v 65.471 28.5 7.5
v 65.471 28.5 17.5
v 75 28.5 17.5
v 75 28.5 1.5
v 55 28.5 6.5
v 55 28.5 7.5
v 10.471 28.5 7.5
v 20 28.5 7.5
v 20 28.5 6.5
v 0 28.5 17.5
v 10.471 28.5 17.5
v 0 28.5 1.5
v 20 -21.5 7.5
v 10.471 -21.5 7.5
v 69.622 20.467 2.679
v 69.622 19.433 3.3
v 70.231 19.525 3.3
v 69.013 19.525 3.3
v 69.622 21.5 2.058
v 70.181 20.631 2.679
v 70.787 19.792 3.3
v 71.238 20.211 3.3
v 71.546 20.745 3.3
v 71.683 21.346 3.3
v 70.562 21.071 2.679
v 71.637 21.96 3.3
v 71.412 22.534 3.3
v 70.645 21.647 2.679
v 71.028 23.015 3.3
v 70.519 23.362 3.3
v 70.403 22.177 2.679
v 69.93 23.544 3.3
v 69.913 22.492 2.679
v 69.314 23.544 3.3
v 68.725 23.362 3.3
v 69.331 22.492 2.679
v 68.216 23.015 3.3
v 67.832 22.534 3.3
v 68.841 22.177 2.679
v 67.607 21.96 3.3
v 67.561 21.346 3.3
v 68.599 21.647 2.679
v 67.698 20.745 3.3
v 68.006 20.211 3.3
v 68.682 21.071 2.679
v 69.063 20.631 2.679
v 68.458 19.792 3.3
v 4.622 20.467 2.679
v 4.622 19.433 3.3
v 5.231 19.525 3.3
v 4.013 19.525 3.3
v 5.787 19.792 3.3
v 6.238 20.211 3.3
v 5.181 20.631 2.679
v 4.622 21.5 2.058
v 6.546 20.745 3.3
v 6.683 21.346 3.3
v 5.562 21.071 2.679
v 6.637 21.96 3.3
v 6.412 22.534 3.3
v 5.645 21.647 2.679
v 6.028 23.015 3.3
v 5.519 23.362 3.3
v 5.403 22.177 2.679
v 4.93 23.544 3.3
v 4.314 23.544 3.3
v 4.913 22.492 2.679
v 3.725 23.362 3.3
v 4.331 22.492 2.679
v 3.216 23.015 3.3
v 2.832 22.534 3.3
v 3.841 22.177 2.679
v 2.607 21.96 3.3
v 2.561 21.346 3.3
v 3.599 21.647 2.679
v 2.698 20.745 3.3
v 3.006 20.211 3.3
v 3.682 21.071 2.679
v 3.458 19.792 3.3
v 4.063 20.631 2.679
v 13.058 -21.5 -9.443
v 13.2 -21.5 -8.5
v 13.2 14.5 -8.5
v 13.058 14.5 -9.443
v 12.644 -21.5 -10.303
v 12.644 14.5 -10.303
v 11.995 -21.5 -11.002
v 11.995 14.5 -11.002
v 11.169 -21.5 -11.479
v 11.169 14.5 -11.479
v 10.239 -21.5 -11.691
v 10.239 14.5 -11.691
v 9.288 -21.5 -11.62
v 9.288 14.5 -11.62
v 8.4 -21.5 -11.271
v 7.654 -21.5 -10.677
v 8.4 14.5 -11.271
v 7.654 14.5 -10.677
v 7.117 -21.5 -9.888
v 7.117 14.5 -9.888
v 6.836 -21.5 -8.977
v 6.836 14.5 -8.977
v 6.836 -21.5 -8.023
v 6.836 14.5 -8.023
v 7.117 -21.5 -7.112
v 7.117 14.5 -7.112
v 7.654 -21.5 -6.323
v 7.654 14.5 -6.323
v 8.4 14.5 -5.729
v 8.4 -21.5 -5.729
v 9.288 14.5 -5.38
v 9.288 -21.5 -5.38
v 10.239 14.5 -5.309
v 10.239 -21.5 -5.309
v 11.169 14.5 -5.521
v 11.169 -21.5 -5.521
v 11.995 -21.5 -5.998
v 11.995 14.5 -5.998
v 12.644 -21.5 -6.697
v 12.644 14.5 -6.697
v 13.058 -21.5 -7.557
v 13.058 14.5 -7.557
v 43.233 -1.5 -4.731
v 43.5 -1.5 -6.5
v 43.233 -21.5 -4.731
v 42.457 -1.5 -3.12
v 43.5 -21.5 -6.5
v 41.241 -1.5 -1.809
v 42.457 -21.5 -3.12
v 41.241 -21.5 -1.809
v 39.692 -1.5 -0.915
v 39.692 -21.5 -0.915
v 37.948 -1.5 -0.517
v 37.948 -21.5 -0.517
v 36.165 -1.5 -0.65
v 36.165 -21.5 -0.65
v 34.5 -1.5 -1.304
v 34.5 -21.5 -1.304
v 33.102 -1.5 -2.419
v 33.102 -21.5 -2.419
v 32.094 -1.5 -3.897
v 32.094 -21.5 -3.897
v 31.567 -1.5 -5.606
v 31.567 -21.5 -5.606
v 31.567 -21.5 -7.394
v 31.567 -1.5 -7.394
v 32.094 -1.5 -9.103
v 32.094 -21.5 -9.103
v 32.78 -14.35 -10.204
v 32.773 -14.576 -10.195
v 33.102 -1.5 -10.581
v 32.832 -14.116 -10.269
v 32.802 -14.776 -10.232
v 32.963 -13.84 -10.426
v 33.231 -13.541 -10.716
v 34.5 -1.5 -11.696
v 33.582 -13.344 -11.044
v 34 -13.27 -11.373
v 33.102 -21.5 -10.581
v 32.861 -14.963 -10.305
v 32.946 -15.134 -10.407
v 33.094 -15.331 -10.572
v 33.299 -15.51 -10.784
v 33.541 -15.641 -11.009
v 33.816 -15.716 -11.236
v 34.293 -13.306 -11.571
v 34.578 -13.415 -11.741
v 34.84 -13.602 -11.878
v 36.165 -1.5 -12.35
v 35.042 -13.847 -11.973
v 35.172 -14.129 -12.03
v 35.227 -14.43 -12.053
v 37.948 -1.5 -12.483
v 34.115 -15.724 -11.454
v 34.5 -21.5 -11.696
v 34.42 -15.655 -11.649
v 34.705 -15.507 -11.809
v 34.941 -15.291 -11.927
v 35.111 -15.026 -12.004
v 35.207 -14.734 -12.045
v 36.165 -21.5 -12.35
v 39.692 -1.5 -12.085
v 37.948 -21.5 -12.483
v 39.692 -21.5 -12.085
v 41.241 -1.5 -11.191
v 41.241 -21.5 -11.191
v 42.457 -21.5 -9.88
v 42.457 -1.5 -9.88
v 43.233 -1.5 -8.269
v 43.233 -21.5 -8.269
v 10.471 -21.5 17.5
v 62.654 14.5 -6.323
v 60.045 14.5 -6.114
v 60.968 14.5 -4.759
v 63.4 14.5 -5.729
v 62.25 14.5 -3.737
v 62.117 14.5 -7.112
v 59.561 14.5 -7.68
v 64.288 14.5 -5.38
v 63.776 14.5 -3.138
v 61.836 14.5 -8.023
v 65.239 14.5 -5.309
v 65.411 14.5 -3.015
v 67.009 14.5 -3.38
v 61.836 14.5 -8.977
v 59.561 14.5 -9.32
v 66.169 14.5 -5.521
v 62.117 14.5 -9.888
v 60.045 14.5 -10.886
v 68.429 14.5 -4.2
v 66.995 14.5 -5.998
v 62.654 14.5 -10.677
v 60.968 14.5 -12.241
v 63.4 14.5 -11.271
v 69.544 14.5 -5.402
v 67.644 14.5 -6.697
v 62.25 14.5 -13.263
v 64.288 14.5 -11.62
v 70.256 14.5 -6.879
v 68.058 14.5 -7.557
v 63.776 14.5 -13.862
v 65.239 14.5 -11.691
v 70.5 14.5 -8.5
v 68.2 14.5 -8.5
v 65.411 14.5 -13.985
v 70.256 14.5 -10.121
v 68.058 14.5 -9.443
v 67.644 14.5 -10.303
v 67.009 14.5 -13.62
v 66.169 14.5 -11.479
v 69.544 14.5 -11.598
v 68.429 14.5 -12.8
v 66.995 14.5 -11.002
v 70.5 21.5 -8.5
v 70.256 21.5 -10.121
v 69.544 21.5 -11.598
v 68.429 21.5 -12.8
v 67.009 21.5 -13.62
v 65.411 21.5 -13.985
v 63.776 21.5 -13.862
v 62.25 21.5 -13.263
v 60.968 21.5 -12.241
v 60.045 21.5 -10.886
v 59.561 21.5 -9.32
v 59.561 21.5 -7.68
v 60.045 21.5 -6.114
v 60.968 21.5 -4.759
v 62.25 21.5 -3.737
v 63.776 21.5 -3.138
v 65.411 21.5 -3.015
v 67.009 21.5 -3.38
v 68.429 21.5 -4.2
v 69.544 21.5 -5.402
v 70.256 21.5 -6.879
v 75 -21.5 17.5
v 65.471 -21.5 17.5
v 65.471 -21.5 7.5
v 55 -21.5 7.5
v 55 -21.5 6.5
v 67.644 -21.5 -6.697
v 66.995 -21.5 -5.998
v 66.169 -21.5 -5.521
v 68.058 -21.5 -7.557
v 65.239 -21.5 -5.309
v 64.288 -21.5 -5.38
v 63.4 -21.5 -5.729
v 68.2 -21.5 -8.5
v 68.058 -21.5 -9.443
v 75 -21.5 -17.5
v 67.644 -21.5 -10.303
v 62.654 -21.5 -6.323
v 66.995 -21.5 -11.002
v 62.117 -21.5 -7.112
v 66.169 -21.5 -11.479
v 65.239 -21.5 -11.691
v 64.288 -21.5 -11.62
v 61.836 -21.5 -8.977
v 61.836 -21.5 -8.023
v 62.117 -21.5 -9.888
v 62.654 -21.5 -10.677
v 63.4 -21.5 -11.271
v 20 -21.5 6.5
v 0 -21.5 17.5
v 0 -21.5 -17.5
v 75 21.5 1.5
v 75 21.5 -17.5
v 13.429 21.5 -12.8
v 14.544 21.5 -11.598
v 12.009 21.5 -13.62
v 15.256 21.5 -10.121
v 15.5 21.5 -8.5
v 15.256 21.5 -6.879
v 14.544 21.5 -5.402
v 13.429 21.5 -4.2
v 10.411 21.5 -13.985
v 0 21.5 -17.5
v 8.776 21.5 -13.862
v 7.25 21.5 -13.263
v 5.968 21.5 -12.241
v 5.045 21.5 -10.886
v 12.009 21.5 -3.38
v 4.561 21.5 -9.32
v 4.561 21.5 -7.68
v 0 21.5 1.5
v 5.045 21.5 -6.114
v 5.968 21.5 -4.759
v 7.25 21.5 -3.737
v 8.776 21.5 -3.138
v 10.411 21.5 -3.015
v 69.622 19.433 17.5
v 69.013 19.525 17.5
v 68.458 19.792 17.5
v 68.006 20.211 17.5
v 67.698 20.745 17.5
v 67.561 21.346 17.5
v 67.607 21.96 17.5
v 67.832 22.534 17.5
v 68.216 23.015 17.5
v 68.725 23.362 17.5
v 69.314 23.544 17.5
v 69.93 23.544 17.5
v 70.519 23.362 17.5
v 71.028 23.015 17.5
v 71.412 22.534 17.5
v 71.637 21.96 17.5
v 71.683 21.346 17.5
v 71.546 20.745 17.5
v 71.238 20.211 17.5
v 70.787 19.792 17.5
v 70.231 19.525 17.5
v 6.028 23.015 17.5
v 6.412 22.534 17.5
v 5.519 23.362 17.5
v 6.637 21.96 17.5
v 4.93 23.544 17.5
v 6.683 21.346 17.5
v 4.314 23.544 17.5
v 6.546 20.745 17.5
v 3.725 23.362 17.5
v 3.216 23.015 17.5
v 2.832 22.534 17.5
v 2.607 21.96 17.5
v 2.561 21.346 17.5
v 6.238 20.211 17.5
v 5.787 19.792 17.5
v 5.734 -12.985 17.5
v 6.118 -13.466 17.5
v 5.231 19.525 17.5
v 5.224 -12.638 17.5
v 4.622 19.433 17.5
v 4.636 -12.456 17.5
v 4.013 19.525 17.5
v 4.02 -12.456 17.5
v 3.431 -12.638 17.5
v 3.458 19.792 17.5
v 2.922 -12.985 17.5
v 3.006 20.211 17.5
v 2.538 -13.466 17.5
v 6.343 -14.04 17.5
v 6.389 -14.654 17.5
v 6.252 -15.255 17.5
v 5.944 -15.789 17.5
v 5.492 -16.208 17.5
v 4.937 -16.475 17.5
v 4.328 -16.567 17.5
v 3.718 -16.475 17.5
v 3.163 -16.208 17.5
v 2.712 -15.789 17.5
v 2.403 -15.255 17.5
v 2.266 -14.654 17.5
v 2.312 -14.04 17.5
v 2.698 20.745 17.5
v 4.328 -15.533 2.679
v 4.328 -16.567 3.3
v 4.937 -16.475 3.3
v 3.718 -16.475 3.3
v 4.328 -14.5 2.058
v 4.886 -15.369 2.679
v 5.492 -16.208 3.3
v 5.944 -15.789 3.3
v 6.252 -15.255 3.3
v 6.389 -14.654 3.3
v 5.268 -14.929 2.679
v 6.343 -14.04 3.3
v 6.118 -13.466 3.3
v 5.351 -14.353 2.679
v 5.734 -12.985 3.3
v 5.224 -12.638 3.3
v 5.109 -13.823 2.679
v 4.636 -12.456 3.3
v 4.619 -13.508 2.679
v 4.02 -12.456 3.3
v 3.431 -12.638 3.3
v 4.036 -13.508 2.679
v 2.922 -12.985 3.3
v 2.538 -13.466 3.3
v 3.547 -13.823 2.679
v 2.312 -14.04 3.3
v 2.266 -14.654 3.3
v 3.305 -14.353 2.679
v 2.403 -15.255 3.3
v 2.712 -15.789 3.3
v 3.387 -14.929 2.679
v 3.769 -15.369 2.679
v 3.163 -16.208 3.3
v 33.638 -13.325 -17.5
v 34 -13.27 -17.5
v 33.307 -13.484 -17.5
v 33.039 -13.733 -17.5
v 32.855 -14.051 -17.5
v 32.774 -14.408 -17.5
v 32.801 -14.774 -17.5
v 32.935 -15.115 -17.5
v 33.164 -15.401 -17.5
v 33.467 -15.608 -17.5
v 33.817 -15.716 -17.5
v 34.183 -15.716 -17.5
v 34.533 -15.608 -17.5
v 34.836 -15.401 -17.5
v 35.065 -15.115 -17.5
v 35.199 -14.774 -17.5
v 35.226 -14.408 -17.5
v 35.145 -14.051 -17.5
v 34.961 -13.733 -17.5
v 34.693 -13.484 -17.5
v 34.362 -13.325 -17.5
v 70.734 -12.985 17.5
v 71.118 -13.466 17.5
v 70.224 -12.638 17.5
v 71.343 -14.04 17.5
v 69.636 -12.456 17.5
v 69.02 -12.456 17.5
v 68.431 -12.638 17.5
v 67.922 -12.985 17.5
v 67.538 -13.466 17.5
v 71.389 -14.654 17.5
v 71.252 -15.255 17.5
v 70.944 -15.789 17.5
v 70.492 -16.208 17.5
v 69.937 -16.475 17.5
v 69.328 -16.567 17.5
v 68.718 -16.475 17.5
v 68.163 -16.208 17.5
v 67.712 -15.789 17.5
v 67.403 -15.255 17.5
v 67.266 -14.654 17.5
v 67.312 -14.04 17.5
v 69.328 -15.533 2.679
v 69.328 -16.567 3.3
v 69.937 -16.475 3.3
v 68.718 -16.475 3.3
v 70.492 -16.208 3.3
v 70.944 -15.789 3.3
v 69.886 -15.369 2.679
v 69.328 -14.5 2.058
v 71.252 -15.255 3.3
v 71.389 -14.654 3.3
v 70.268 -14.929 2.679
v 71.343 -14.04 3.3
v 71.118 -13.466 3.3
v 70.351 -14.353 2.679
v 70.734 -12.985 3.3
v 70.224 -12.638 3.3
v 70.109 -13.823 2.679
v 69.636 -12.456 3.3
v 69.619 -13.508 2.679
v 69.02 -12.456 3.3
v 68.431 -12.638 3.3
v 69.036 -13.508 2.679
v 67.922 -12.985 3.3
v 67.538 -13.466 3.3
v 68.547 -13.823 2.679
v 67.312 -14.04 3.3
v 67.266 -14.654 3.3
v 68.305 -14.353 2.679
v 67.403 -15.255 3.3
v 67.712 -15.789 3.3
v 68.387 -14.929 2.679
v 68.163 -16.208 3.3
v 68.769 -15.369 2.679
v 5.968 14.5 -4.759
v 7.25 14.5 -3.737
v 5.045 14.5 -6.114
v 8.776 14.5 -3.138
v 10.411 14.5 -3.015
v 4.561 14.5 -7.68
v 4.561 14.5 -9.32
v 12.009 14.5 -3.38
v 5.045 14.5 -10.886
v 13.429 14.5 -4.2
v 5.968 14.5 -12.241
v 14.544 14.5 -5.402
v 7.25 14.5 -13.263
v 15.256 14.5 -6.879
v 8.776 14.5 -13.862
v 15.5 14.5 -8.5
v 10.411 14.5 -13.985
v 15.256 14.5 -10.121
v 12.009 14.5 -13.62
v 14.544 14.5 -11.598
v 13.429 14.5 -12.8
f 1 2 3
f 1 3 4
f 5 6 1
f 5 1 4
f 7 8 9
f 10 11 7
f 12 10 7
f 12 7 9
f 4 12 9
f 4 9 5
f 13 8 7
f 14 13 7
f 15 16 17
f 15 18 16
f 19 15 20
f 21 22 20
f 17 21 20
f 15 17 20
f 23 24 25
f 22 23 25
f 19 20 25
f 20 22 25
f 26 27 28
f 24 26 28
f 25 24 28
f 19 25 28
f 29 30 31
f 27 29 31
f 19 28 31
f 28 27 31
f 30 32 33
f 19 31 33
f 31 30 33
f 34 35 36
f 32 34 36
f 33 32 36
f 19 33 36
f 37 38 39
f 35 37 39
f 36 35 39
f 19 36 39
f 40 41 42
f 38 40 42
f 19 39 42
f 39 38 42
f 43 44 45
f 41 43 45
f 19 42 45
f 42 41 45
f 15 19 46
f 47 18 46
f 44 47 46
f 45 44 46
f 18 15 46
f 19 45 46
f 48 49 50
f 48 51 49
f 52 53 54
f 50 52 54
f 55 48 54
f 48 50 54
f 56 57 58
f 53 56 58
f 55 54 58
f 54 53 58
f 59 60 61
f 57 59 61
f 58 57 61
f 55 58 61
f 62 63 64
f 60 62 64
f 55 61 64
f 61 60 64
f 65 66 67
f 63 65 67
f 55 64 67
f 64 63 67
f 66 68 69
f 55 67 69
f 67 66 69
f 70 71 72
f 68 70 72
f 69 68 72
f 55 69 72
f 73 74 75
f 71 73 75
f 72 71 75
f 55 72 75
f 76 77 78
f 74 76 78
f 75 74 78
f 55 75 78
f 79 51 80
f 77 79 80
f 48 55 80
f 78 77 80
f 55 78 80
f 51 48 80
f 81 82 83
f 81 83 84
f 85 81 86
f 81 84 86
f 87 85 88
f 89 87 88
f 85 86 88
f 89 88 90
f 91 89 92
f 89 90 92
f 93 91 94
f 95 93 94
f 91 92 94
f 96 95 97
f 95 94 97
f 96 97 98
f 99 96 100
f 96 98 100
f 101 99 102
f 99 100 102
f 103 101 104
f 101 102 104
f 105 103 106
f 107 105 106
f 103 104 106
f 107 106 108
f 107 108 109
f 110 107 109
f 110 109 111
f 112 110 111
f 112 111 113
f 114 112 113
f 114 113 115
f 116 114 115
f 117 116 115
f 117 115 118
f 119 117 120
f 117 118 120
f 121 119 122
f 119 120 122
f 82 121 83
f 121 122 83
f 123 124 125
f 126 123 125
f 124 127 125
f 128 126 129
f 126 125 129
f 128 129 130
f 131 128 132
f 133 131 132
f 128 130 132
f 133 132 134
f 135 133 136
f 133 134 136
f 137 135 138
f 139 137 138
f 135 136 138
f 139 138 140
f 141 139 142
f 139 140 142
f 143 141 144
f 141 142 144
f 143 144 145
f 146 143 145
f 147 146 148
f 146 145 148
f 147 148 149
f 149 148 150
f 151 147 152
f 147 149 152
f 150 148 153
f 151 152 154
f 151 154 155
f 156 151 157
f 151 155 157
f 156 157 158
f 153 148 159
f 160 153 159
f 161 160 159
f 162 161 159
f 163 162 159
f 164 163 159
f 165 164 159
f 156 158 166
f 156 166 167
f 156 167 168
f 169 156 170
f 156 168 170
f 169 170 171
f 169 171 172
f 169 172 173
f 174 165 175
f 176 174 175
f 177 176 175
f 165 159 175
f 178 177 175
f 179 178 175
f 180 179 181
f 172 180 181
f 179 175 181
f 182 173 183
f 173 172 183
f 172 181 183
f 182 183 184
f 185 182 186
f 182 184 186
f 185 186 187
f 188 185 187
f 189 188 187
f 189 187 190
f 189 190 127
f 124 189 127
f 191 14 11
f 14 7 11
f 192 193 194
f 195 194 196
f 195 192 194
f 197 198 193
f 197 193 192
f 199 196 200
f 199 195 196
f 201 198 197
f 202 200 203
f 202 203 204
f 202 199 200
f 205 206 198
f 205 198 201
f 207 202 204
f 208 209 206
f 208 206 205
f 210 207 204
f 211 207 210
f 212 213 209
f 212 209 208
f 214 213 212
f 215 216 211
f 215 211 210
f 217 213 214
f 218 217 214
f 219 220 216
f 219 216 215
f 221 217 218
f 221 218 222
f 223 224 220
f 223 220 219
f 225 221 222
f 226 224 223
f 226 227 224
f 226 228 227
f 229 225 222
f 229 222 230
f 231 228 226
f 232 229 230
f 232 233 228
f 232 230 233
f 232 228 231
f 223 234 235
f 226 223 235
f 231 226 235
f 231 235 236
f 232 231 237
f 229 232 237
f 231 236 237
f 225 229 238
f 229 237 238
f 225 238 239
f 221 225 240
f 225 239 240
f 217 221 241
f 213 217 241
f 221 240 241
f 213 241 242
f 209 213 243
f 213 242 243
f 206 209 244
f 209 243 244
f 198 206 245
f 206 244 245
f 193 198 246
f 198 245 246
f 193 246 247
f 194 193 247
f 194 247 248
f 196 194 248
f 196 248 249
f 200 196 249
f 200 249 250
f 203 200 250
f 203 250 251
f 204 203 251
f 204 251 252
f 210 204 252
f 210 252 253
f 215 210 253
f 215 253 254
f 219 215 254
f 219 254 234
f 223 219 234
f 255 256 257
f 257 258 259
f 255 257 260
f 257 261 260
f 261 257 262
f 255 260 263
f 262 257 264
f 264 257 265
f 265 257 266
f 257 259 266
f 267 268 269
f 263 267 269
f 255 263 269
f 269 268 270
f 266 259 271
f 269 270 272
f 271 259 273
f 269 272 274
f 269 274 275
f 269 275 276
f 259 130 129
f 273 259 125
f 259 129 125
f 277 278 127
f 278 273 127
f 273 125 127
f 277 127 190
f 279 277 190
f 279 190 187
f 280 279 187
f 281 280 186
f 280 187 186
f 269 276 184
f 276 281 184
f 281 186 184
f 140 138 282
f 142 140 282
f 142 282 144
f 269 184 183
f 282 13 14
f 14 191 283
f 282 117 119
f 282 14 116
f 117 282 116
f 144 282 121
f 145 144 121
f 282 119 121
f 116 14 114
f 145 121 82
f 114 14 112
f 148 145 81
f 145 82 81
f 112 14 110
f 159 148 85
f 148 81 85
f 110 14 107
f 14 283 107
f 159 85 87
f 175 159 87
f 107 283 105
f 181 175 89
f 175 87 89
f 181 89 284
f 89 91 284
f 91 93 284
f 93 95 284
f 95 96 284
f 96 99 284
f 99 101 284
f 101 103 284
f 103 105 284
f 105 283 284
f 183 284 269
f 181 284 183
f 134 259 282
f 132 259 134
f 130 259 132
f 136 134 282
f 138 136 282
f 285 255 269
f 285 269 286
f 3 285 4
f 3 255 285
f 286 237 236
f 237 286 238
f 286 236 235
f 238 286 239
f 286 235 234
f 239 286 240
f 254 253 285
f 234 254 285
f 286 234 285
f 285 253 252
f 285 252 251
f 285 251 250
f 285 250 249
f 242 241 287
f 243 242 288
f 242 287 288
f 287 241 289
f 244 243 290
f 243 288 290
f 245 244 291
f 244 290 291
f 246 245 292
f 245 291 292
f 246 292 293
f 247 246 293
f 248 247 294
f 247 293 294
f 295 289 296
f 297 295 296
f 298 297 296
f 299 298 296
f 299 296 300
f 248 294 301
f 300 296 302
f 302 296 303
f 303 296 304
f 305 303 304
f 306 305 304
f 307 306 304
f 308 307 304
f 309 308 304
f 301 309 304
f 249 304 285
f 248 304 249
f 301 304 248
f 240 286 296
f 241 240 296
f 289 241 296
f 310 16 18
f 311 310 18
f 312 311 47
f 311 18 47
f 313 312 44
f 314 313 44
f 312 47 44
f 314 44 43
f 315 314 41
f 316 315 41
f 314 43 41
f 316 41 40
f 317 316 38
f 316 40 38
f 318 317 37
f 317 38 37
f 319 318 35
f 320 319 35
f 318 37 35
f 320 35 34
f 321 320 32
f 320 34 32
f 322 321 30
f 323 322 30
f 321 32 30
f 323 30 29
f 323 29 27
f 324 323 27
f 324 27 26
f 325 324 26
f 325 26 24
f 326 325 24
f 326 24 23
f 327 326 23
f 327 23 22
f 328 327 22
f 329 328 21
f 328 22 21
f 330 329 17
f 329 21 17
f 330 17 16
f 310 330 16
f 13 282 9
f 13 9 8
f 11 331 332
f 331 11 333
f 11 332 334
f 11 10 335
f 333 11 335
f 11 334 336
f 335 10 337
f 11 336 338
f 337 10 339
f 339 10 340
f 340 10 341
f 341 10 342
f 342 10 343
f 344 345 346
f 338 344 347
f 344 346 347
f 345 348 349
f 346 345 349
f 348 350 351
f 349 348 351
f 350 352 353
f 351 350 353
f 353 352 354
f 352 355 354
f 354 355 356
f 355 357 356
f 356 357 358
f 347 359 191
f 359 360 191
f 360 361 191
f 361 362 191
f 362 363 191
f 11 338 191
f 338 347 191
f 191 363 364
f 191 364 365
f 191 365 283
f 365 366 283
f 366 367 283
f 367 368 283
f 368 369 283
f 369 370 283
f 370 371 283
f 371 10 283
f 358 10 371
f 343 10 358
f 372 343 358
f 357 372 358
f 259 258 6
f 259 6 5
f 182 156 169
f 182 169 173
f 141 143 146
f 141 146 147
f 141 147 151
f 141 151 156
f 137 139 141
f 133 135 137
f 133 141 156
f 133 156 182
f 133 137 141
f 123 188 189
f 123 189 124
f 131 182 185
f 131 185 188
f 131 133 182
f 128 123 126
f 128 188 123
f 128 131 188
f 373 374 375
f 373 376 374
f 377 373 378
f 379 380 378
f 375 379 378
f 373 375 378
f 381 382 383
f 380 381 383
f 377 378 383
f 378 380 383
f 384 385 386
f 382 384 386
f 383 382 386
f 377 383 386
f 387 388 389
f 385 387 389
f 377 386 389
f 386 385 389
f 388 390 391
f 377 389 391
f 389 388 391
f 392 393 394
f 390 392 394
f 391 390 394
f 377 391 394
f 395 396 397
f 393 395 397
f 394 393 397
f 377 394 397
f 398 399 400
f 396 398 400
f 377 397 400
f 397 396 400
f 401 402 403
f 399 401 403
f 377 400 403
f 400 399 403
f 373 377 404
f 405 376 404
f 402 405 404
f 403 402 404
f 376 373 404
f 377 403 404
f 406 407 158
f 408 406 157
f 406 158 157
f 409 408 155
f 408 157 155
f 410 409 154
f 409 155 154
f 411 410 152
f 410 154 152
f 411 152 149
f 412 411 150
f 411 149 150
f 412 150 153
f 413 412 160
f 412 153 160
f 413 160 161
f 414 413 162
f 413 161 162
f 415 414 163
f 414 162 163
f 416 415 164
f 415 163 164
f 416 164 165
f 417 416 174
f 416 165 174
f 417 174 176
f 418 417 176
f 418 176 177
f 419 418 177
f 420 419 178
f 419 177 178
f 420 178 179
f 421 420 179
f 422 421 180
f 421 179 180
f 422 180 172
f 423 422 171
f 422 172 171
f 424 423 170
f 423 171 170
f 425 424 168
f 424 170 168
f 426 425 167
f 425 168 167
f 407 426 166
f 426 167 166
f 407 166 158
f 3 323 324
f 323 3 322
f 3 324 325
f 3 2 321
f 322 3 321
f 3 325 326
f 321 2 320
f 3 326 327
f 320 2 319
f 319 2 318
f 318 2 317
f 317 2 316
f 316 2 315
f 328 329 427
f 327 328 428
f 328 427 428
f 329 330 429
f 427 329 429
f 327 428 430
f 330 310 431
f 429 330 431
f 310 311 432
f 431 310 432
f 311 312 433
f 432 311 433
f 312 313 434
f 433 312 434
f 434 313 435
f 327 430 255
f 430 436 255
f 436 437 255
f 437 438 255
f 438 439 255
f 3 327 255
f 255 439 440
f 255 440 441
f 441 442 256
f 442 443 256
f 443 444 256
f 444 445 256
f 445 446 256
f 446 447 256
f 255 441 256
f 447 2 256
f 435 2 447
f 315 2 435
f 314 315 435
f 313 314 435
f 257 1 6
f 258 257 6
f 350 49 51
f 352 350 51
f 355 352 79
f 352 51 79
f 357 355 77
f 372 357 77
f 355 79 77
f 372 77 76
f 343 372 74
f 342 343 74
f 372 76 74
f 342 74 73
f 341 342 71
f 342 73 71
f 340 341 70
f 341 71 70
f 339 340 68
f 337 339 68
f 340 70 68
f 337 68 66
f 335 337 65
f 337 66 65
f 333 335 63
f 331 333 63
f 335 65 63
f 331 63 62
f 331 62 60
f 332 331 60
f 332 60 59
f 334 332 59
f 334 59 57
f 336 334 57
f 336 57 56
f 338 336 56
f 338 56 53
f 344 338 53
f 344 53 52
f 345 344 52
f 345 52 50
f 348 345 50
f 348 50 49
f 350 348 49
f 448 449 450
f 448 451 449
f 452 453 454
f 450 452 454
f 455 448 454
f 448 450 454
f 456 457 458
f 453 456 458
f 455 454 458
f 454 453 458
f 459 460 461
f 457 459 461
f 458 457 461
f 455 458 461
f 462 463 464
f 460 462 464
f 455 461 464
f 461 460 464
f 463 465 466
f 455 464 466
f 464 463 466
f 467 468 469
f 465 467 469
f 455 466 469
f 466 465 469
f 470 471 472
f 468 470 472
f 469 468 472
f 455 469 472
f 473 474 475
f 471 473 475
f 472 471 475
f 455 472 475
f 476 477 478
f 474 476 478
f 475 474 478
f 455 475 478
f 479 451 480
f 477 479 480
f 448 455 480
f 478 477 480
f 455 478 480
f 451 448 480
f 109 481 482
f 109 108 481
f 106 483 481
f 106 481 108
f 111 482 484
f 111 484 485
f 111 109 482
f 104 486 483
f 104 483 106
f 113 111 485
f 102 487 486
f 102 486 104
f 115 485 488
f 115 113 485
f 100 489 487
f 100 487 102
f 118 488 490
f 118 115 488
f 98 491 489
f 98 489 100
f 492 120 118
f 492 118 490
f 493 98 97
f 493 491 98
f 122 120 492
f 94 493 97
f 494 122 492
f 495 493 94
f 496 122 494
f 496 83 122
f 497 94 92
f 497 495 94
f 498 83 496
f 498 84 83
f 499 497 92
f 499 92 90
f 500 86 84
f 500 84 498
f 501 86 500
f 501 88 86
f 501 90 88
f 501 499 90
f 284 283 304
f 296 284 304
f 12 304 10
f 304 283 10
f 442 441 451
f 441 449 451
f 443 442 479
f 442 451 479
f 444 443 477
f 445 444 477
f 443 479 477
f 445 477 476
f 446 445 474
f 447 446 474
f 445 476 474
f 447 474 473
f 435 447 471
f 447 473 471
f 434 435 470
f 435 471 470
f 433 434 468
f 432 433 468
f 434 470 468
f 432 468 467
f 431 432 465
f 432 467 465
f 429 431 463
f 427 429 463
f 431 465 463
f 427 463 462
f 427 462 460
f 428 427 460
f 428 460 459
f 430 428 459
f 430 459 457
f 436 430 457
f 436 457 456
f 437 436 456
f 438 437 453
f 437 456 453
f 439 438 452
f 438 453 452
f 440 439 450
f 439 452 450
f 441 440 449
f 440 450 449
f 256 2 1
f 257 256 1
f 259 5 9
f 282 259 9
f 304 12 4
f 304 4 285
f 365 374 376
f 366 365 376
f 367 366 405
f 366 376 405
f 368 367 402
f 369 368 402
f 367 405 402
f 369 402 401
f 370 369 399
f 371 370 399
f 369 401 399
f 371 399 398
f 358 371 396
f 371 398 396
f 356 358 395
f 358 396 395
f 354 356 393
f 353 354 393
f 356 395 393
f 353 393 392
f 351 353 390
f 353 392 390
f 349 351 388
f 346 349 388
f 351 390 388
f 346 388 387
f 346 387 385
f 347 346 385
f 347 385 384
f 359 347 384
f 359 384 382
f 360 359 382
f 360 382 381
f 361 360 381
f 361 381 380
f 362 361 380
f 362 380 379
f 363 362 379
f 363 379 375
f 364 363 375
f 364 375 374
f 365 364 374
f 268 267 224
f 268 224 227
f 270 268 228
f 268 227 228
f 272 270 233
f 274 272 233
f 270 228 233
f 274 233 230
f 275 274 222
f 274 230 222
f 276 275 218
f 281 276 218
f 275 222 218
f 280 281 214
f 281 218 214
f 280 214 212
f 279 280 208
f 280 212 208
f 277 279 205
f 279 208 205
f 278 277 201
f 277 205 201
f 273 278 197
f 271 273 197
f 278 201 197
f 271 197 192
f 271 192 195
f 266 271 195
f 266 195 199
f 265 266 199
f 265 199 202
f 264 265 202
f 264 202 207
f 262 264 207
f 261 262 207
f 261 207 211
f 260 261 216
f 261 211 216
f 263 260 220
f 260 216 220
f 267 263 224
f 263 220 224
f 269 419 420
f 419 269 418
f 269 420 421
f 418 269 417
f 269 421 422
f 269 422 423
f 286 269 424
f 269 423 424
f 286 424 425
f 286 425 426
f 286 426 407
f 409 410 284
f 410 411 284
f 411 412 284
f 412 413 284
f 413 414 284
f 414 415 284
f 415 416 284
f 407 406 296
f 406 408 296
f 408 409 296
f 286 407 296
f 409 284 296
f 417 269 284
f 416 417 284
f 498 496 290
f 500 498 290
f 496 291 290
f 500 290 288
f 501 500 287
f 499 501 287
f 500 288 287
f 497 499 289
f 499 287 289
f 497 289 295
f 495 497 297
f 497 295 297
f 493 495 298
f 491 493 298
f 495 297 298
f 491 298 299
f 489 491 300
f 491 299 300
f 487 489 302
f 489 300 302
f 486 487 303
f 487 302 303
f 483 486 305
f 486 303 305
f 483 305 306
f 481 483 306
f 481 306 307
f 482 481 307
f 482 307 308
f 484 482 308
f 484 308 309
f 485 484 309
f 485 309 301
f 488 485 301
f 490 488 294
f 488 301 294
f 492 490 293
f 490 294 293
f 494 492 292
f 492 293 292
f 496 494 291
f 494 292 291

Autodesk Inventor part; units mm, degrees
ref_plane "YZ Plane" through (0, 0, 0) normal (1, 0, 0) x (0, 1, 0)
ref_plane "XZ Plane" through (0, 0, 0) normal (0, 1, 0) x (-1, 0, 0)
ref_plane "XY Plane" through (0, 0, 0) normal (0, 0, 1) x (1, 0, 0)
sketch "Sketch1" plane through (0, 0, 0) normal (1, 0, 0) x (0, 1, 0)
  line L0 (-21.5, -17.5) -> (21.5, -17.5)
  line L1 (21.5, -17.5) -> (21.5, 1.5)
  line L2 (21.5, 17.5) -> (-21.5, 17.5)
  line L3 (-21.5, 17.5) -> (-21.5, -17.5)
  line L4 (-21.5, -17.5) -> (21.5, 17.5) construction
  line L5 (21.5, -17.5) -> (-21.5, 17.5) construction
  line L6 (18.0188, 17.5) -> (28.5, 17.5)
  line L7 (28.5, 17.5) -> (28.5, 1.5)
  line L8 (28.5, 1.5) -> (21.5, 1.5)
  point P0 (0, 0)
  dimension "d0" = 43
  dimension "d1" = 35
  dimension "d2" = 50
  dimension "d3" = 16
extrude "Extrusion1" add sketch "Sketch1" along normal blind 75
sketch "Sketch2" plane through (0, 28.5, 17.5) normal (0, 1, 0) x (1, 0, 0)
  line L0 (0, 0) -> (75, 0) projected
  line L1 (65.4712, 0) -> (65.4712, 10)
  line L2 (65.4712, 10) -> (55, 10)
  line L3 (55, 10) -> (55, 11)
  line L4 (55, 11) -> (20, 11)
  line L5 (20, 11) -> (20, 10)
  line L6 (20, 10) -> (10.4712, 10)
  line L7 (10.4712, 10) -> (10.4712, 0)
  line L8 (0, 35) -> (75, 35) projected
  line L9 (37.5, 35) -> (37.5, 5.3668)
  point P0 (0, 17.5)
  dimension "d6" = 55
  dimension "d7" = 35
  dimension "d8" = 17.5
  dimension "d9" = 11
  dimension "d10" = 10
extrude "Extrusion2" cut sketch "Sketch2" against normal blind 75
sketch "Sketch3" plane through (0, 21.5, 1.5) normal (0, 1, 0) x (1, 0, 0)
  circle A0 centre (10, 10) radius 5.5
  circle A1 centre (65, 10) radius 5.5
  line L0 (0, 19) -> (75, 19) projected
  line L1 (75, 19) -> (75, 0) projected
  line L2 (0, -16) -> (10.4712, -16) projected
  line L3 (65.4712, -16) -> (75, -16) projected
  point P0 (0, 1.5)
  dimension "d13" = 11
  dimension "d14" = 11
  dimension "d15" = 55
  dimension "d19" = 26
  dimension "d20" = 26
extrude "Extrusion3" cut sketch "Sketch3" against normal blind 7
sketch "Sketch4" plane through (65, 14.5, -8.5) normal (0, 1, 0) x (1, 0, 0)
  circle A0 centre (0, 0) radius 5.5 projected
  circle A1 centre (0, 0) radius 3.2
  circle A2 centre (-55, 0) radius 5.5 projected
  circle A3 centre (-55, 0) radius 3.2
  point P0 (-65, -8.5)
  dimension "d23" = 6.4
  dimension "d24" = 6.4
extrude "Extrusion4" cut sketch "Sketch4" against normal blind 40 contours A1 | A3
sketch "Sketch7" plane through (0, -21.5, 17.5) normal (0, 0, 1) x (1, 0, 0)
  line L0 (0, 0) -> (10.4712, 0) projected
  line L1 (0, 50) -> (10.4712, 50) projected
  point P0 (0, 21.5)
  point P1 (4.3276, 7)
  point P2 (4.6222, 43)
  point P3 (5.2356, 0)
  dimension "d31" = 7
  dimension "d32" = 36
  dimension "d33" = 7
hole "Hole1" at (4.3276, -14.5, 17.5) at (4.6222, 21.5, 17.5) direction (0, 0, -1) diameter 4.134 depth 14.2 tip angle 118 thread size "M5x0.8" class "6H" standard "ISO Metric profile"
pattern_linear "Rectangular Pattern1" count 2 spacing 65 along (1, 0, 0) of "Hole1"
sketch "Sketch9" plane through (0, -21.5, -17.5) normal (0, -1, 0) x (1, 0, 0)
  circle A0 centre (37.5, 11) radius 6
  line L0 (0, 35) -> (0, 0) projected
  line L1 (0, 35) -> (10.4712, 35) projected
  point P0 (0, 17.5)
  dimension "d53" = 37.5
  dimension "d54" = 24
  dimension "d55" = 12
extrude "Extrusion6" cut sketch "Sketch9" against normal blind 20
sketch "Sketch10" plane through (0, -21.5, -17.5) normal (0, 0, -1) x (-1, 0, 0)
  line L0 (0, 0) -> (0, 43) projected
  line L1 (0, 0) -> (-75, 0) projected
  line L2 (-75, 0) -> (-75, 43) projected
  point P0 (0, 21.5)
  point P1 (-34, 7)
  dimension "d59" = 7
  dimension "d60" = 41
hole "Hole3" at (34, -14.5, -17.5) direction (0, 0, 1) diameter 2.459 depth 8.8 tip angle 118 thread size "M3x0.5" class "6H" standard "ISO Metric profile"
properties part number "Lose Backe"
